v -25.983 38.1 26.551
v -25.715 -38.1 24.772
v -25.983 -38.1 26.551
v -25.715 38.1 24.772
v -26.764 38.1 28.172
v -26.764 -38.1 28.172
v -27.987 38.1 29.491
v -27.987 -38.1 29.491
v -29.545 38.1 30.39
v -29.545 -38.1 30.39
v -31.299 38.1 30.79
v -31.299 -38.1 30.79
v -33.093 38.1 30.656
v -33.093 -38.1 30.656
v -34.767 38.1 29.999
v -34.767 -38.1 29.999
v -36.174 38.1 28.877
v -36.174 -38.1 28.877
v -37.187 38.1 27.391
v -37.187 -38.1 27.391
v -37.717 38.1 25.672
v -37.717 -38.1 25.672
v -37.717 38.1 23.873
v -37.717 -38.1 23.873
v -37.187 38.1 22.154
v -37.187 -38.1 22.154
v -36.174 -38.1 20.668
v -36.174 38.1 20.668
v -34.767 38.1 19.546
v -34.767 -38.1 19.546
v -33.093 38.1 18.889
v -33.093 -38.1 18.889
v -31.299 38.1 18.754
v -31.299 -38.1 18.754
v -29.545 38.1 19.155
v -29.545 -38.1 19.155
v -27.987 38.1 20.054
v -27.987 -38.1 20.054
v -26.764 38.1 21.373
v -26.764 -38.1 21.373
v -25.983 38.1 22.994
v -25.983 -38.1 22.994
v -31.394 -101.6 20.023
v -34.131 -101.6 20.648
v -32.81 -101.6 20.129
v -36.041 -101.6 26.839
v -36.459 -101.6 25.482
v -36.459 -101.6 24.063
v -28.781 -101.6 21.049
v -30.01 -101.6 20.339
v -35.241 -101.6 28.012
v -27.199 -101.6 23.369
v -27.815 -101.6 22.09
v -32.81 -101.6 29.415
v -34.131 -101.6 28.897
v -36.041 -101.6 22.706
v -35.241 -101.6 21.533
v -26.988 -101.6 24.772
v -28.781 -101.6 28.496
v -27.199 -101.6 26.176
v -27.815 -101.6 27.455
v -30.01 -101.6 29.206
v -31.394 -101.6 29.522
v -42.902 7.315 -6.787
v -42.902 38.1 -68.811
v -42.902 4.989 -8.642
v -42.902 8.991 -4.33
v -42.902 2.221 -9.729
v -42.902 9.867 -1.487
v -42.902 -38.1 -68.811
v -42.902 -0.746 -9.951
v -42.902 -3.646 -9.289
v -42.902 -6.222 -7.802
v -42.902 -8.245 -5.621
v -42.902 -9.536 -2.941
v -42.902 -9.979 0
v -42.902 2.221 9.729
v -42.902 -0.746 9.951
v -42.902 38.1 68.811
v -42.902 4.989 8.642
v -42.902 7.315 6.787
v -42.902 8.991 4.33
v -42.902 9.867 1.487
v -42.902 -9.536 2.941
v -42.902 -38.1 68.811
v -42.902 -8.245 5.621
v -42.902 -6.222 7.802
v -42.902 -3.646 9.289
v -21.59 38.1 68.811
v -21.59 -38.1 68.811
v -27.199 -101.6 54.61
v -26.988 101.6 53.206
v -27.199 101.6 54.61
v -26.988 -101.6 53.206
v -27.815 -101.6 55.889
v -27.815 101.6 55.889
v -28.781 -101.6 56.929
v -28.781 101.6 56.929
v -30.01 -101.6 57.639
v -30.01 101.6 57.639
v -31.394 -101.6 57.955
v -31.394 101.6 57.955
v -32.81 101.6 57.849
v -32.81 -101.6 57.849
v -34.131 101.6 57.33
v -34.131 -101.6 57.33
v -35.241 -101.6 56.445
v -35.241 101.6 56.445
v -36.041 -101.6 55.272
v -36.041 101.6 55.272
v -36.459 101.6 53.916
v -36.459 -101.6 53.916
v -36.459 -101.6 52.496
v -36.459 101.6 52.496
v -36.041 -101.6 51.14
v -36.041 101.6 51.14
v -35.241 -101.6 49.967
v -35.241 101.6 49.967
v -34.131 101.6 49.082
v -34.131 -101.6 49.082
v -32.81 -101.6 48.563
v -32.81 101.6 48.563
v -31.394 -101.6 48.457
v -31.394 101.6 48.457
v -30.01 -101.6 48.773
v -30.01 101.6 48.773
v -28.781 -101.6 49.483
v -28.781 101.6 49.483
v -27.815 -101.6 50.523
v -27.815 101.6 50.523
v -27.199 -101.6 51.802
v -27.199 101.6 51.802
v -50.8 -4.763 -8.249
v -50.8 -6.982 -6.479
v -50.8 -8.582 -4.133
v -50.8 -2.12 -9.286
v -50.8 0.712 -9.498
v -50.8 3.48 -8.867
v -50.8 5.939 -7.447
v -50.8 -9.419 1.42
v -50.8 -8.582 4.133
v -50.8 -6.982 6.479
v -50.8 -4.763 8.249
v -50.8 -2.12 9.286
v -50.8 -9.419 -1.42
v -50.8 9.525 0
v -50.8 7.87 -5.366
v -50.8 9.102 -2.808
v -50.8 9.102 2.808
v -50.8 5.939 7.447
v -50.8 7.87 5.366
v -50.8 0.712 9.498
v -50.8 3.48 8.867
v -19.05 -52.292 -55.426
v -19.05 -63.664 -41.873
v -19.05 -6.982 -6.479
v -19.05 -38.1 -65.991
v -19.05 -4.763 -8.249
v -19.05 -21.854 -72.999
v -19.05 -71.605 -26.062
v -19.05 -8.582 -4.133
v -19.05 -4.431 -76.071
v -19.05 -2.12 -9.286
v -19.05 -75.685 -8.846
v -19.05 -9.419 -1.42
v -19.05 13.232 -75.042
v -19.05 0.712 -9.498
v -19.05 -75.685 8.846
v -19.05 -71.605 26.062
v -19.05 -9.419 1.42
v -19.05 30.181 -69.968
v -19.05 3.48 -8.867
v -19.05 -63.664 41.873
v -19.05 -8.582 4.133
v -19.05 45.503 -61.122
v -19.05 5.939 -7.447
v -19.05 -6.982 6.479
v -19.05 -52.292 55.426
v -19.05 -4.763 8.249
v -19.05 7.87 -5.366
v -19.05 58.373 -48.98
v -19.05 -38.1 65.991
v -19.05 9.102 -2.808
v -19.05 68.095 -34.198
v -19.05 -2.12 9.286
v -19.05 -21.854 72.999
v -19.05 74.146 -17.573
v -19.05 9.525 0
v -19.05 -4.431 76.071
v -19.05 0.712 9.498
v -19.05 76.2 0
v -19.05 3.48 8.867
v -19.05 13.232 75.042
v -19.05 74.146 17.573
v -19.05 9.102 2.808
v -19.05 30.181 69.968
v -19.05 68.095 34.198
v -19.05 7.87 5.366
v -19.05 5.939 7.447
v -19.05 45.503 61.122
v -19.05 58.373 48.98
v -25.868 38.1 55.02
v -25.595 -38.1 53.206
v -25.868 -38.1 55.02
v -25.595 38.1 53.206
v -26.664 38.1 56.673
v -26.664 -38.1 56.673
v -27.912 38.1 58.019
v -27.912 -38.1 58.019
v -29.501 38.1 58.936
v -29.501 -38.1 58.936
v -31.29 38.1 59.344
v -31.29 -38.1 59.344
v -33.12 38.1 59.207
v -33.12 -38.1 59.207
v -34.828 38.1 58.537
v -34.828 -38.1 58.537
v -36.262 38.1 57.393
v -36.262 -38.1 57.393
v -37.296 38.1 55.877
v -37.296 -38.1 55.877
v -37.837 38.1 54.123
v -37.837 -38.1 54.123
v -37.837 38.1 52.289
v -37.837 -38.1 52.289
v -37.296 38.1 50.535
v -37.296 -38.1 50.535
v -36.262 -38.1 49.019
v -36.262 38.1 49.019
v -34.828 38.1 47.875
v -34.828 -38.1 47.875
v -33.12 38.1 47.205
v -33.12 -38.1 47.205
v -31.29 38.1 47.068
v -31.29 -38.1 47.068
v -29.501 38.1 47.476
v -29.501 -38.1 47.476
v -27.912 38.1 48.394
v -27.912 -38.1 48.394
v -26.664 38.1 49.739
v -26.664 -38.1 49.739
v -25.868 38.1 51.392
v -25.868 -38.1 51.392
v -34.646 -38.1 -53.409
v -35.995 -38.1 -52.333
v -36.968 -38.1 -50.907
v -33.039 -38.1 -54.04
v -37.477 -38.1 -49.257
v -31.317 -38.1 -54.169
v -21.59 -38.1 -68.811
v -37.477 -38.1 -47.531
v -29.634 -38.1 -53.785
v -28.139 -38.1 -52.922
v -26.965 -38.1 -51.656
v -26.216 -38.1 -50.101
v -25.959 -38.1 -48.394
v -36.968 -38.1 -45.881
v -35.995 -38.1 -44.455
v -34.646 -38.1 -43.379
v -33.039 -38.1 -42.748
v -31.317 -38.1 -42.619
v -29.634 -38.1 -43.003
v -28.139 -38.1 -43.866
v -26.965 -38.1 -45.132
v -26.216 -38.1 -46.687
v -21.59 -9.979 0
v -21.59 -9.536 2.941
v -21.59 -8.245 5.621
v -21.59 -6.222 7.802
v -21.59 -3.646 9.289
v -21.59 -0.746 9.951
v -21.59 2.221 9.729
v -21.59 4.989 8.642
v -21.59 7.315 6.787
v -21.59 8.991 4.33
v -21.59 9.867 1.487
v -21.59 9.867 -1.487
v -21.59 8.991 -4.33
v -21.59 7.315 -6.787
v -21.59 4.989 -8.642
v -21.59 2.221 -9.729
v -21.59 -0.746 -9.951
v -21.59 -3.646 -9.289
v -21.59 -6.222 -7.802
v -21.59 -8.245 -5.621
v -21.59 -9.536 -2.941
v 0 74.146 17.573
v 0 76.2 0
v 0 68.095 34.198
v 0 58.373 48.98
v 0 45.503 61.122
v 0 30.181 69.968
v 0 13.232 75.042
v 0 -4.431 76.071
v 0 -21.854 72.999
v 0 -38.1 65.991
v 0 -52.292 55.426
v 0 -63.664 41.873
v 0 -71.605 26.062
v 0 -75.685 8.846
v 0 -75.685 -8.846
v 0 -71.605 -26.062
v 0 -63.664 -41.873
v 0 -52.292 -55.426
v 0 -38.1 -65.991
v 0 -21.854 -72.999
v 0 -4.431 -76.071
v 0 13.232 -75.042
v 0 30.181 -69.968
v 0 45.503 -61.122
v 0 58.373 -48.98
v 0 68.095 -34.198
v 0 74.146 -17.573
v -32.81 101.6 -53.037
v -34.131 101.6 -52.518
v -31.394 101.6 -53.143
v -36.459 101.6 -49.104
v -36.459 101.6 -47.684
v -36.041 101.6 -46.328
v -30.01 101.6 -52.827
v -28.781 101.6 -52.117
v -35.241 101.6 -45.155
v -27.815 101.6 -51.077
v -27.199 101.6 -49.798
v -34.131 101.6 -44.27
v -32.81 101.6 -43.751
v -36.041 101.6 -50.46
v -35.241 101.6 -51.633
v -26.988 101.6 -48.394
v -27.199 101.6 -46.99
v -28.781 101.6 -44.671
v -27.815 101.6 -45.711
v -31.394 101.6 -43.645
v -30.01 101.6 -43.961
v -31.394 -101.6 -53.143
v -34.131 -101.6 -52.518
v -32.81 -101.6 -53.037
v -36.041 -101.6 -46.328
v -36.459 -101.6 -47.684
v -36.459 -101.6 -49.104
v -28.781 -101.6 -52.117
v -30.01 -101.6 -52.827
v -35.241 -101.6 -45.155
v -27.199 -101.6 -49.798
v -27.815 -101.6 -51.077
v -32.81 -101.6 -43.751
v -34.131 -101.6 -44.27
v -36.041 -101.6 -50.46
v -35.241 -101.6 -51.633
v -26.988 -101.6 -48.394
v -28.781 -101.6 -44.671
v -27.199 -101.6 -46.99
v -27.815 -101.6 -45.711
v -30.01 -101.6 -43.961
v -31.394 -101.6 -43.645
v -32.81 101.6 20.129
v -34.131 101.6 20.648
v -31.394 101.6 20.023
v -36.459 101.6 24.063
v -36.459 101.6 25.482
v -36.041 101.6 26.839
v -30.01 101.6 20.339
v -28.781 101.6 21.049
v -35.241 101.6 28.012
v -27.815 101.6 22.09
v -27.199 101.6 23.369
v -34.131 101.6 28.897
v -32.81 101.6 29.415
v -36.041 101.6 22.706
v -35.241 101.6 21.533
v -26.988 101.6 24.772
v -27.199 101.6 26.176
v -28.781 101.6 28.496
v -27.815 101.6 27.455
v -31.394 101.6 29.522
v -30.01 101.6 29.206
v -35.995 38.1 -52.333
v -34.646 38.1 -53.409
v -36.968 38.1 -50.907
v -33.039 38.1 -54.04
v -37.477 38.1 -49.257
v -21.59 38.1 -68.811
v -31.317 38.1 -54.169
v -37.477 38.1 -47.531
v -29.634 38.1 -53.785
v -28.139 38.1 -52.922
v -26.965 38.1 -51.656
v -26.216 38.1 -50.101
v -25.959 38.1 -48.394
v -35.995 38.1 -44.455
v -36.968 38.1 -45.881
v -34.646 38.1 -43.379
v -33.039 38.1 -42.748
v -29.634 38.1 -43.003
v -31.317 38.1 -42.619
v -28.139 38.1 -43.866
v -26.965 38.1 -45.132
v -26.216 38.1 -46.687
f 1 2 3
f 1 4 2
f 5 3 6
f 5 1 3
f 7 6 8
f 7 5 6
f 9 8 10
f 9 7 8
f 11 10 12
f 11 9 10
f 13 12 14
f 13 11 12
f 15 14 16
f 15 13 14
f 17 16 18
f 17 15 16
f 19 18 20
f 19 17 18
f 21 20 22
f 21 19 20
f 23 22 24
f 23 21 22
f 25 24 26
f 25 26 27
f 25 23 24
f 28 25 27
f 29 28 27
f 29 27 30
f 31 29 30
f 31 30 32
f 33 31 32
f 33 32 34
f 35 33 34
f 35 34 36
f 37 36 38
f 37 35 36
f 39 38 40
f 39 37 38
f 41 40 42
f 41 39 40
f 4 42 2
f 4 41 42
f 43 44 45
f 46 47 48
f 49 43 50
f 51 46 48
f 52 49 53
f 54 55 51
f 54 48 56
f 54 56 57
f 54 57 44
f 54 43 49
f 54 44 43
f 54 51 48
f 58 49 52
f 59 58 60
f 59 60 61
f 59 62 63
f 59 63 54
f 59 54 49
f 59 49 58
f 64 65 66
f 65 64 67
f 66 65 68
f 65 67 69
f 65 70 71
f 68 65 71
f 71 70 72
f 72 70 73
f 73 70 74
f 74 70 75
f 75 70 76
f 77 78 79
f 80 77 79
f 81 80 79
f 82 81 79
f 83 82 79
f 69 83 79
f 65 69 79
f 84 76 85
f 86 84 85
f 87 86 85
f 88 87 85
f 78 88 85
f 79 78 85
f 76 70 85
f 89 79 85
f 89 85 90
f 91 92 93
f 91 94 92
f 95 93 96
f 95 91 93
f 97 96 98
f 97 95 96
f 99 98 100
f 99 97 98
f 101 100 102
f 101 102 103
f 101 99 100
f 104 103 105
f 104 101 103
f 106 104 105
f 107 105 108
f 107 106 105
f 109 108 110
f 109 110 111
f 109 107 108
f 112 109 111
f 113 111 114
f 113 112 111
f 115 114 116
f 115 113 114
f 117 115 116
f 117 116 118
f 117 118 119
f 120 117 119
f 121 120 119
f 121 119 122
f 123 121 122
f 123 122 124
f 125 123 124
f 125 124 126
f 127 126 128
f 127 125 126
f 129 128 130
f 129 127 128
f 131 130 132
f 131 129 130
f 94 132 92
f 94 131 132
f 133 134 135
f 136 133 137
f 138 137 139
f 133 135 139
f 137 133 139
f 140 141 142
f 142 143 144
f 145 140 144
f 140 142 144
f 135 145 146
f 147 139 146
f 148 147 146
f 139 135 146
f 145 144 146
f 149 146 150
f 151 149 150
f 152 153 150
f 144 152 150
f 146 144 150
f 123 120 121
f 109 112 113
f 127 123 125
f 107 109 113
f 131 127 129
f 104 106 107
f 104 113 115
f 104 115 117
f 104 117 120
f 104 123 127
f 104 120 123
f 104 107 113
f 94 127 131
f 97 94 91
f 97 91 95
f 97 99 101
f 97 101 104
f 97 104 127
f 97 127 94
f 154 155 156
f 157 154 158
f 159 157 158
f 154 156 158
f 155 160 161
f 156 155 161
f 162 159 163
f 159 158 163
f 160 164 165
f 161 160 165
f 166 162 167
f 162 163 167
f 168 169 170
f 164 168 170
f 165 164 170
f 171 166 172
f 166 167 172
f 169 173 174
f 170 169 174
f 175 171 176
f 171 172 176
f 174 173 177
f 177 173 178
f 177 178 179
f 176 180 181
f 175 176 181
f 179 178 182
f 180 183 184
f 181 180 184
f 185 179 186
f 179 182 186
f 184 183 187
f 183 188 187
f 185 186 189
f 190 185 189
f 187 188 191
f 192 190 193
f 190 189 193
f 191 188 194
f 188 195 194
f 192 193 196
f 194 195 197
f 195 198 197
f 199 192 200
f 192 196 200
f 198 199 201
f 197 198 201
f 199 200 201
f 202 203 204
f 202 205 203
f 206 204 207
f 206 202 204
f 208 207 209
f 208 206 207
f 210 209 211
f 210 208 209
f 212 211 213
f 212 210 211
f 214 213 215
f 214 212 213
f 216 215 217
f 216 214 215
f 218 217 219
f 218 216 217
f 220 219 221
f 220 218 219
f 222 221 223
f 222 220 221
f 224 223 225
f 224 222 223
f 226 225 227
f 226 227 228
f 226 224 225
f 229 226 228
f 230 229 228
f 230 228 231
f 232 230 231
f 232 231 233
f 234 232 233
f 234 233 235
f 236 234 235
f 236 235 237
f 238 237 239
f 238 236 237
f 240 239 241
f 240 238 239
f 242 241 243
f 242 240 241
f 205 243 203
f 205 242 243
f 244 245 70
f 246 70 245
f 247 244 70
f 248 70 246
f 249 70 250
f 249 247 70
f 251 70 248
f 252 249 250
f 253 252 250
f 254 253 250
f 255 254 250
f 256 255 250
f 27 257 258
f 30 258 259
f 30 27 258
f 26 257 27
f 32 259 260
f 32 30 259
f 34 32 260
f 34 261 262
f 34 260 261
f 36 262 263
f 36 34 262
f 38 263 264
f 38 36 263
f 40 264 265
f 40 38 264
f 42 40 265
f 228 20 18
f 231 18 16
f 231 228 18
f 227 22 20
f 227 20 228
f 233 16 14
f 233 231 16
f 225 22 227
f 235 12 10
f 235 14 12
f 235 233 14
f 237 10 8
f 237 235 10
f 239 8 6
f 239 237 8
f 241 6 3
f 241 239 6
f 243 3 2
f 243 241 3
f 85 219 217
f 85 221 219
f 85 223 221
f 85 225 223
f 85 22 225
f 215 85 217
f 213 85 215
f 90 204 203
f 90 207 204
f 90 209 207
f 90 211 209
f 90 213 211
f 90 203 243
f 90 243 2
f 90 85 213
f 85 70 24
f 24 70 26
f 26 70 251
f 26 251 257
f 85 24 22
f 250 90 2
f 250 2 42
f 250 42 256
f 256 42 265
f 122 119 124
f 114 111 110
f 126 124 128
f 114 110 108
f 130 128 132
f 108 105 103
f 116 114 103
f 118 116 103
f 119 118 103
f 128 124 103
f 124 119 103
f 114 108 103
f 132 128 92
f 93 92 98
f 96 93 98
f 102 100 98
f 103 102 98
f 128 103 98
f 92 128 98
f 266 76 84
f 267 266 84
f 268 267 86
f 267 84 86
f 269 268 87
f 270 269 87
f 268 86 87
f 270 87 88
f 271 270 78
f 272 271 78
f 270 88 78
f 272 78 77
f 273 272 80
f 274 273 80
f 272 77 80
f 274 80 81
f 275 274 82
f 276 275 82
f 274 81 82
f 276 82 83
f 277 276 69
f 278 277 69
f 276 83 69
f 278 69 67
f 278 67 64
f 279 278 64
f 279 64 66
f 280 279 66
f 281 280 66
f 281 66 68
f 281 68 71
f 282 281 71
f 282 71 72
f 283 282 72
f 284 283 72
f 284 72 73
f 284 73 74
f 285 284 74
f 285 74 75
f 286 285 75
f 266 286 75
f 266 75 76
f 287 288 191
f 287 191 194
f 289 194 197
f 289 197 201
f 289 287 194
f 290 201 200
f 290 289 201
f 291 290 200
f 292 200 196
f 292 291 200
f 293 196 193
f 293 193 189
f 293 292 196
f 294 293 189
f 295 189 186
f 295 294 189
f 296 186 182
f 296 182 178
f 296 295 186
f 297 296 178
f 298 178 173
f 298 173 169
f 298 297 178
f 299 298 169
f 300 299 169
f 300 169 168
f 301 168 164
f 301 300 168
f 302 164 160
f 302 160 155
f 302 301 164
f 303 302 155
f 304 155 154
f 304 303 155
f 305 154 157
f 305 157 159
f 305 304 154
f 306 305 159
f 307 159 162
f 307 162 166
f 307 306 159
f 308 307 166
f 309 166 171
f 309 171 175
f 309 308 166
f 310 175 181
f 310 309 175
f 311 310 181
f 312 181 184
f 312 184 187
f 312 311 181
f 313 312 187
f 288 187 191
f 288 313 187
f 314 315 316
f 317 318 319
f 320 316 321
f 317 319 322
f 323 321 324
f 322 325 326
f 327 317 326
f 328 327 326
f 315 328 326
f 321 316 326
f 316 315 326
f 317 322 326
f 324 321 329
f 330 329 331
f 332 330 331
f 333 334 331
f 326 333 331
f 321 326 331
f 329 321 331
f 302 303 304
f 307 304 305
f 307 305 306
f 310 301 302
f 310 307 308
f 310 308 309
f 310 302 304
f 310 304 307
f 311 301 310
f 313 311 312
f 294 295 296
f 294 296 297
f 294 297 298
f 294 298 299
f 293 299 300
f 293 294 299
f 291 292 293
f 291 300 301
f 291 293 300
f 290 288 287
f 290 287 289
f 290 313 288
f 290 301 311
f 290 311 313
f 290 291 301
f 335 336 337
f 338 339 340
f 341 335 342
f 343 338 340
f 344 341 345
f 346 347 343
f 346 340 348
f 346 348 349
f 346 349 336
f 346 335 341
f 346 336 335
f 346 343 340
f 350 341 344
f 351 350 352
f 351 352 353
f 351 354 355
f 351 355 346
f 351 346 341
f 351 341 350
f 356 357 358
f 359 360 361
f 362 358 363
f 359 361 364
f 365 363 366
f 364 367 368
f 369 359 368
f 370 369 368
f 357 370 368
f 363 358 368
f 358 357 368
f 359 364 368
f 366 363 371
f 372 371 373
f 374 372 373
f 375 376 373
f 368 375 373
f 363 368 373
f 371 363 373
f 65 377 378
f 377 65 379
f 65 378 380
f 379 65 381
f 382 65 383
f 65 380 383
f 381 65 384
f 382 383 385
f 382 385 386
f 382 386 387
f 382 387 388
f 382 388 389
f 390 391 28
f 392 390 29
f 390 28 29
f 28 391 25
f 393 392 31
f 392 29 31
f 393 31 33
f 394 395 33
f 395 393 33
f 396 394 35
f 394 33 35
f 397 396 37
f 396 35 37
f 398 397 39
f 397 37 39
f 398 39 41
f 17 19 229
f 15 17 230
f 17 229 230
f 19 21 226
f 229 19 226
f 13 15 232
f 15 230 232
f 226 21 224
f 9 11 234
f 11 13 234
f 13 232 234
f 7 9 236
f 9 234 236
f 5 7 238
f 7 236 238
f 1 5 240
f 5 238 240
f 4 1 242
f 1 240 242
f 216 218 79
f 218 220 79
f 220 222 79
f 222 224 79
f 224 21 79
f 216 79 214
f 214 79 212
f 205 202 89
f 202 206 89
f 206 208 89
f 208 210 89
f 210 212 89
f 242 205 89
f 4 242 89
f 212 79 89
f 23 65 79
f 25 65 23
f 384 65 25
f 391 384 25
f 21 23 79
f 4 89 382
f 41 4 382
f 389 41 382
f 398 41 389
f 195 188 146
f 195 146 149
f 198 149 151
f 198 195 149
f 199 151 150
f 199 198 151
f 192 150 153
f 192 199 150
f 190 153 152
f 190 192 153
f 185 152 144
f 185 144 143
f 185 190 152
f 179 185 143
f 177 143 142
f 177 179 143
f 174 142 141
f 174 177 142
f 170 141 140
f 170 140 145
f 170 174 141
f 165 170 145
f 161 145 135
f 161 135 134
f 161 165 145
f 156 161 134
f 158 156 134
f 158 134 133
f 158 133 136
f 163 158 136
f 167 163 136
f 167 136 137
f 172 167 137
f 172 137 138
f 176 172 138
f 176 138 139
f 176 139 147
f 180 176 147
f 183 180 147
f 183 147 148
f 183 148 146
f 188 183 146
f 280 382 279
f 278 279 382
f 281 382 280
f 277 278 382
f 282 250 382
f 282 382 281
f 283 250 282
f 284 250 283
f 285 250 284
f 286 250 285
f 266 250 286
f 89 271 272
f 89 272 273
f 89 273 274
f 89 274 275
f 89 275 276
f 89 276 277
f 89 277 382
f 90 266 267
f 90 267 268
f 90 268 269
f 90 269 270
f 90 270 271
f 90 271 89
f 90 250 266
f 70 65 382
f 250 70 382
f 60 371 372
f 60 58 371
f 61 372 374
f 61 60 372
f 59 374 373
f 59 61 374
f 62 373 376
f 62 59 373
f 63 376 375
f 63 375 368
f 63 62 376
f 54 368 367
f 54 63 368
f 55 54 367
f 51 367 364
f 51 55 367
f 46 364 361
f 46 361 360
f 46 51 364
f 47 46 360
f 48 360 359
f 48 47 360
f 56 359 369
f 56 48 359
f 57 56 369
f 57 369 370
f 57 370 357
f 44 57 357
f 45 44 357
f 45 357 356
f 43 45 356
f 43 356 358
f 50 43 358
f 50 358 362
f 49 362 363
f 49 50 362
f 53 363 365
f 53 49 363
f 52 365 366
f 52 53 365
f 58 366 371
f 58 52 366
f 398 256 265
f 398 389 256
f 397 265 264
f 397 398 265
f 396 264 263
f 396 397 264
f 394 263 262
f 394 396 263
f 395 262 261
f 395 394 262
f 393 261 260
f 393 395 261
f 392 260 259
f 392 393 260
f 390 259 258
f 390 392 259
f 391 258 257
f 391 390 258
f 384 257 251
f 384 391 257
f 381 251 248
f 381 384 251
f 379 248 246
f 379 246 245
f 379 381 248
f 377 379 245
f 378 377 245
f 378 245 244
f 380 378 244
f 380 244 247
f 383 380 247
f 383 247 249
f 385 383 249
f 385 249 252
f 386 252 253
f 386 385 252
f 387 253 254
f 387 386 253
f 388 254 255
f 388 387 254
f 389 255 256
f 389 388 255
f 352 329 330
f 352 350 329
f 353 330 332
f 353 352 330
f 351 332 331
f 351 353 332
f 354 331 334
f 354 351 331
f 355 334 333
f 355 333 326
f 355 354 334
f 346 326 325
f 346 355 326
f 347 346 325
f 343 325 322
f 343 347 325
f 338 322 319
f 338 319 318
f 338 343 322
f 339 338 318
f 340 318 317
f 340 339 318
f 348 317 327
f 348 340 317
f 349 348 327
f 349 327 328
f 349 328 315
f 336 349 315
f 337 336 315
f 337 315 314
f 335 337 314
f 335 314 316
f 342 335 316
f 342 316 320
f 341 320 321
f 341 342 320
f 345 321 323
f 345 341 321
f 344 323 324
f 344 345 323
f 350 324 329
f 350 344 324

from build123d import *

# Parameters (mm, degrees)
F0_R     = 4.7625
F1_DEPTH = 101.6
F2_R     = 76.2
F2_R_2   = 9.525
F3_DEPTH = 19.05
F4_DEPTH = 50.8
F5_W     = 21.3117243114
F5_H     = 137.6228183508
F5_R     = 5.7912992377
F5_R_2   = 6.0348069949
F5_R_3   = 6.155398866
F6_DEPTH = 38.1
F7_R     = 9.9788565771
F8_DEPTH = 42.9027243114


with BuildPart() as f1:
    # F0 (on Front) → F1 (new body, symmetric)
    with BuildSketch(Plane.XZ):
        with Locations((-31.75, 53.2060163036)):
            Circle(F0_R)
    extrude(amount=F1_DEPTH, both=True)


with BuildPart() as f1b:
    # F0 (on Front) → F1, piece 2 (new body, symmetric)
    with BuildSketch(Plane.XZ):
        with Locations((-31.75, -48.3939836964)):
            Circle(F0_R)
    extrude(amount=F1_DEPTH, both=True)


with BuildPart() as f1c:
    # F0 (on Front) → F1, piece 3 (new body, symmetric)
    with BuildSketch(Plane.XZ):
        with Locations((-31.75, 24.7723255306)):
            Circle(F0_R)
    extrude(amount=F1_DEPTH, both=True)


with BuildPart() as f3:
    # F2 (on Right) → F3 (new body)
    with BuildSketch(Plane.YZ):
        Circle(F2_R)
        Circle(F2_R_2, mode=Mode.SUBTRACT)
    extrude(amount=-F3_DEPTH)

    # F2 (on Right) → F4 (join)
    with BuildSketch(Plane.YZ):
        Circle(F2_R_2)
    extrude(amount=-F4_DEPTH)


with BuildPart() as f6:
    # F5 (on Front) → F6 (new body, symmetric)
    with BuildSketch(Plane.XZ):
        with Locations((-32.2458621557, 0)):
            Rectangle(F5_W, F5_H)
        with Locations((-31.75, -48.3939836964)):
            Circle(F5_R, mode=Mode.SUBTRACT)
        with Locations((-31.75, 24.7723255306)):
            Circle(F5_R_2, mode=Mode.SUBTRACT)
        with Locations((-31.75, 53.2060163036)):
            Circle(F5_R_3, mode=Mode.SUBTRACT)
    extrude(amount=F6_DEPTH, both=True)

    # F7 (on face) → F8 (cut, through all)
    with BuildSketch(Plane(origin=(-42.9017243114, 0, 0), x_dir=(0, -1, 0), z_dir=(-1, 0, 0))):
        Circle(F7_R)
    extrude(amount=-F8_DEPTH, mode=Mode.SUBTRACT)


solid = Compound([f1.part, f1b.part, f1c.part, f3.part, f6.part])
